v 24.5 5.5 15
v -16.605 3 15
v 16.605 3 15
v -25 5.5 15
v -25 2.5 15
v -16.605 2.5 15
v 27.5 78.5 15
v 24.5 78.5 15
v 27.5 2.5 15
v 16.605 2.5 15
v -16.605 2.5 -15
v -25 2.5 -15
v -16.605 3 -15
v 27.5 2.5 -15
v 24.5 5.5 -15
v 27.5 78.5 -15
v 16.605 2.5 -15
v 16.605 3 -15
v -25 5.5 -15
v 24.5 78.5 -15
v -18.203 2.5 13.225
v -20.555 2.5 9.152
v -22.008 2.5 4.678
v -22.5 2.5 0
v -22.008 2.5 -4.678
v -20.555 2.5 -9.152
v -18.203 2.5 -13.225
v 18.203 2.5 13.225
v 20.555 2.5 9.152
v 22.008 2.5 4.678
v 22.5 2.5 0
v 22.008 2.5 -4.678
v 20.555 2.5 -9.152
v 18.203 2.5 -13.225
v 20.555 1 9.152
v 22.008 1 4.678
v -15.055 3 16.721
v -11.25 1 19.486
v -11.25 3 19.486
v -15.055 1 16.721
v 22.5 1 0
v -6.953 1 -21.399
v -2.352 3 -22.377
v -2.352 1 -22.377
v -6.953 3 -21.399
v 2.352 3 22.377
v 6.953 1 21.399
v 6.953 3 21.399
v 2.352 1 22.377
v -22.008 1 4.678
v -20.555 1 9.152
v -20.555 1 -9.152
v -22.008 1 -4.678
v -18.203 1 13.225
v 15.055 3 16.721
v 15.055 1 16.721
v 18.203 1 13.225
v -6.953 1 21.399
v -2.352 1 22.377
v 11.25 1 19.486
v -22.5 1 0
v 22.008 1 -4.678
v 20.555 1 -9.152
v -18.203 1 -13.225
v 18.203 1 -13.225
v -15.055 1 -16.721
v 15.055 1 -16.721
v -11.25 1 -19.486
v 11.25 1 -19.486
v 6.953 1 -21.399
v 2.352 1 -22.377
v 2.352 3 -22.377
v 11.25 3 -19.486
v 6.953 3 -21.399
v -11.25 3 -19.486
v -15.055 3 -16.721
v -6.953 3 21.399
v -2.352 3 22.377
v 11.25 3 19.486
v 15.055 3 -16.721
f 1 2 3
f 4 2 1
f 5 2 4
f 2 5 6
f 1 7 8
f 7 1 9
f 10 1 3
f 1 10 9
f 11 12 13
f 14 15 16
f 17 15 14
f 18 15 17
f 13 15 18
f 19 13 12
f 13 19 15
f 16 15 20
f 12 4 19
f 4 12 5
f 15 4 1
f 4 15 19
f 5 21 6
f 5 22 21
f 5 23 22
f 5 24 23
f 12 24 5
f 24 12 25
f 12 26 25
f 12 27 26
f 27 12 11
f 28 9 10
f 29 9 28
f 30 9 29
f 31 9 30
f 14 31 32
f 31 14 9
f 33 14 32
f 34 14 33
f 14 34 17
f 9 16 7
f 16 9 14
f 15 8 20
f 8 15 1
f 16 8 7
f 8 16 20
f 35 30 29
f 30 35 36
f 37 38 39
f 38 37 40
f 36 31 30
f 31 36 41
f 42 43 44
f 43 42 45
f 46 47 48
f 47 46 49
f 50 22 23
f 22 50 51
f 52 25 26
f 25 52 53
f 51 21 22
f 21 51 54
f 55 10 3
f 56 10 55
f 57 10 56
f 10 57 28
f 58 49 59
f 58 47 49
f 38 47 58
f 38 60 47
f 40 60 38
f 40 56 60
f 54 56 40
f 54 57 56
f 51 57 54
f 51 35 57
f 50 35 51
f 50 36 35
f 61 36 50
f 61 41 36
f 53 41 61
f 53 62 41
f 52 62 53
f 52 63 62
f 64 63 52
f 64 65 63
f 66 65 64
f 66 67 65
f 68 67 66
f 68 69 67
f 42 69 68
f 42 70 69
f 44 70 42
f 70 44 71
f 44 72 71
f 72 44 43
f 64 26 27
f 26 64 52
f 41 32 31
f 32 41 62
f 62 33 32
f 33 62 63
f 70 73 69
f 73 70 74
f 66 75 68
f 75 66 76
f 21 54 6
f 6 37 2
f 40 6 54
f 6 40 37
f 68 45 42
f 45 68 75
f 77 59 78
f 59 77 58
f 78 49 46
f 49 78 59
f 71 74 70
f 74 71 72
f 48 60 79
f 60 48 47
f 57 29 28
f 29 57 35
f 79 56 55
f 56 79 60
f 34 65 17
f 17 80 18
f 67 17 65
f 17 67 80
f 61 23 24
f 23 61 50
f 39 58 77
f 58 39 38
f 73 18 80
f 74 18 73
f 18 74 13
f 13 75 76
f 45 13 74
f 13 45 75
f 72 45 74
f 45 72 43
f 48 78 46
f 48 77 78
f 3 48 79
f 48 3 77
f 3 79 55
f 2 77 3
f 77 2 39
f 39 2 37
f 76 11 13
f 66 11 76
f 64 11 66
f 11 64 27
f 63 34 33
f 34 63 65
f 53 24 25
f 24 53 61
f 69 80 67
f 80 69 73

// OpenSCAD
module lidar(){
    $fn=160;
    rotate([-90,0,90])translate([0,0,-10]){
        color("black")translate([0,0,-8])linear_extrude(10)import("ylidar.dxf","base");
        color("black")translate([0,0,-15])linear_extrude(2)import("ylidar.dxf","base");
        color("gray")translate([0,0,-20])linear_extrude(20)import("ylidar.dxf","motor");
        color("blue")linear_extrude(20)import("ylidar.dxf","rotor1");
        color("blue")linear_extrude(4)import("ylidar.dxf","rotor2");
        color("red")translate([0,0,-20])linear_extrude(20)import("ylidar.dxf","legs");
    }
}

module lidar_support(){
    translate([0,44,0])rotate([0,sin($t*360)*45,0]){
        lidar();
        color("gray",0.5){
            translate([0,-40,0])cube([50,3,30],true);
            translate([26,-3.5,0])cube([3,76,30],true);    
        }
        color("black")translate([0,-42,0])rotate([90,0,0])cylinder(2,22.5,22.5,true);
    }
}

lidar_support();
